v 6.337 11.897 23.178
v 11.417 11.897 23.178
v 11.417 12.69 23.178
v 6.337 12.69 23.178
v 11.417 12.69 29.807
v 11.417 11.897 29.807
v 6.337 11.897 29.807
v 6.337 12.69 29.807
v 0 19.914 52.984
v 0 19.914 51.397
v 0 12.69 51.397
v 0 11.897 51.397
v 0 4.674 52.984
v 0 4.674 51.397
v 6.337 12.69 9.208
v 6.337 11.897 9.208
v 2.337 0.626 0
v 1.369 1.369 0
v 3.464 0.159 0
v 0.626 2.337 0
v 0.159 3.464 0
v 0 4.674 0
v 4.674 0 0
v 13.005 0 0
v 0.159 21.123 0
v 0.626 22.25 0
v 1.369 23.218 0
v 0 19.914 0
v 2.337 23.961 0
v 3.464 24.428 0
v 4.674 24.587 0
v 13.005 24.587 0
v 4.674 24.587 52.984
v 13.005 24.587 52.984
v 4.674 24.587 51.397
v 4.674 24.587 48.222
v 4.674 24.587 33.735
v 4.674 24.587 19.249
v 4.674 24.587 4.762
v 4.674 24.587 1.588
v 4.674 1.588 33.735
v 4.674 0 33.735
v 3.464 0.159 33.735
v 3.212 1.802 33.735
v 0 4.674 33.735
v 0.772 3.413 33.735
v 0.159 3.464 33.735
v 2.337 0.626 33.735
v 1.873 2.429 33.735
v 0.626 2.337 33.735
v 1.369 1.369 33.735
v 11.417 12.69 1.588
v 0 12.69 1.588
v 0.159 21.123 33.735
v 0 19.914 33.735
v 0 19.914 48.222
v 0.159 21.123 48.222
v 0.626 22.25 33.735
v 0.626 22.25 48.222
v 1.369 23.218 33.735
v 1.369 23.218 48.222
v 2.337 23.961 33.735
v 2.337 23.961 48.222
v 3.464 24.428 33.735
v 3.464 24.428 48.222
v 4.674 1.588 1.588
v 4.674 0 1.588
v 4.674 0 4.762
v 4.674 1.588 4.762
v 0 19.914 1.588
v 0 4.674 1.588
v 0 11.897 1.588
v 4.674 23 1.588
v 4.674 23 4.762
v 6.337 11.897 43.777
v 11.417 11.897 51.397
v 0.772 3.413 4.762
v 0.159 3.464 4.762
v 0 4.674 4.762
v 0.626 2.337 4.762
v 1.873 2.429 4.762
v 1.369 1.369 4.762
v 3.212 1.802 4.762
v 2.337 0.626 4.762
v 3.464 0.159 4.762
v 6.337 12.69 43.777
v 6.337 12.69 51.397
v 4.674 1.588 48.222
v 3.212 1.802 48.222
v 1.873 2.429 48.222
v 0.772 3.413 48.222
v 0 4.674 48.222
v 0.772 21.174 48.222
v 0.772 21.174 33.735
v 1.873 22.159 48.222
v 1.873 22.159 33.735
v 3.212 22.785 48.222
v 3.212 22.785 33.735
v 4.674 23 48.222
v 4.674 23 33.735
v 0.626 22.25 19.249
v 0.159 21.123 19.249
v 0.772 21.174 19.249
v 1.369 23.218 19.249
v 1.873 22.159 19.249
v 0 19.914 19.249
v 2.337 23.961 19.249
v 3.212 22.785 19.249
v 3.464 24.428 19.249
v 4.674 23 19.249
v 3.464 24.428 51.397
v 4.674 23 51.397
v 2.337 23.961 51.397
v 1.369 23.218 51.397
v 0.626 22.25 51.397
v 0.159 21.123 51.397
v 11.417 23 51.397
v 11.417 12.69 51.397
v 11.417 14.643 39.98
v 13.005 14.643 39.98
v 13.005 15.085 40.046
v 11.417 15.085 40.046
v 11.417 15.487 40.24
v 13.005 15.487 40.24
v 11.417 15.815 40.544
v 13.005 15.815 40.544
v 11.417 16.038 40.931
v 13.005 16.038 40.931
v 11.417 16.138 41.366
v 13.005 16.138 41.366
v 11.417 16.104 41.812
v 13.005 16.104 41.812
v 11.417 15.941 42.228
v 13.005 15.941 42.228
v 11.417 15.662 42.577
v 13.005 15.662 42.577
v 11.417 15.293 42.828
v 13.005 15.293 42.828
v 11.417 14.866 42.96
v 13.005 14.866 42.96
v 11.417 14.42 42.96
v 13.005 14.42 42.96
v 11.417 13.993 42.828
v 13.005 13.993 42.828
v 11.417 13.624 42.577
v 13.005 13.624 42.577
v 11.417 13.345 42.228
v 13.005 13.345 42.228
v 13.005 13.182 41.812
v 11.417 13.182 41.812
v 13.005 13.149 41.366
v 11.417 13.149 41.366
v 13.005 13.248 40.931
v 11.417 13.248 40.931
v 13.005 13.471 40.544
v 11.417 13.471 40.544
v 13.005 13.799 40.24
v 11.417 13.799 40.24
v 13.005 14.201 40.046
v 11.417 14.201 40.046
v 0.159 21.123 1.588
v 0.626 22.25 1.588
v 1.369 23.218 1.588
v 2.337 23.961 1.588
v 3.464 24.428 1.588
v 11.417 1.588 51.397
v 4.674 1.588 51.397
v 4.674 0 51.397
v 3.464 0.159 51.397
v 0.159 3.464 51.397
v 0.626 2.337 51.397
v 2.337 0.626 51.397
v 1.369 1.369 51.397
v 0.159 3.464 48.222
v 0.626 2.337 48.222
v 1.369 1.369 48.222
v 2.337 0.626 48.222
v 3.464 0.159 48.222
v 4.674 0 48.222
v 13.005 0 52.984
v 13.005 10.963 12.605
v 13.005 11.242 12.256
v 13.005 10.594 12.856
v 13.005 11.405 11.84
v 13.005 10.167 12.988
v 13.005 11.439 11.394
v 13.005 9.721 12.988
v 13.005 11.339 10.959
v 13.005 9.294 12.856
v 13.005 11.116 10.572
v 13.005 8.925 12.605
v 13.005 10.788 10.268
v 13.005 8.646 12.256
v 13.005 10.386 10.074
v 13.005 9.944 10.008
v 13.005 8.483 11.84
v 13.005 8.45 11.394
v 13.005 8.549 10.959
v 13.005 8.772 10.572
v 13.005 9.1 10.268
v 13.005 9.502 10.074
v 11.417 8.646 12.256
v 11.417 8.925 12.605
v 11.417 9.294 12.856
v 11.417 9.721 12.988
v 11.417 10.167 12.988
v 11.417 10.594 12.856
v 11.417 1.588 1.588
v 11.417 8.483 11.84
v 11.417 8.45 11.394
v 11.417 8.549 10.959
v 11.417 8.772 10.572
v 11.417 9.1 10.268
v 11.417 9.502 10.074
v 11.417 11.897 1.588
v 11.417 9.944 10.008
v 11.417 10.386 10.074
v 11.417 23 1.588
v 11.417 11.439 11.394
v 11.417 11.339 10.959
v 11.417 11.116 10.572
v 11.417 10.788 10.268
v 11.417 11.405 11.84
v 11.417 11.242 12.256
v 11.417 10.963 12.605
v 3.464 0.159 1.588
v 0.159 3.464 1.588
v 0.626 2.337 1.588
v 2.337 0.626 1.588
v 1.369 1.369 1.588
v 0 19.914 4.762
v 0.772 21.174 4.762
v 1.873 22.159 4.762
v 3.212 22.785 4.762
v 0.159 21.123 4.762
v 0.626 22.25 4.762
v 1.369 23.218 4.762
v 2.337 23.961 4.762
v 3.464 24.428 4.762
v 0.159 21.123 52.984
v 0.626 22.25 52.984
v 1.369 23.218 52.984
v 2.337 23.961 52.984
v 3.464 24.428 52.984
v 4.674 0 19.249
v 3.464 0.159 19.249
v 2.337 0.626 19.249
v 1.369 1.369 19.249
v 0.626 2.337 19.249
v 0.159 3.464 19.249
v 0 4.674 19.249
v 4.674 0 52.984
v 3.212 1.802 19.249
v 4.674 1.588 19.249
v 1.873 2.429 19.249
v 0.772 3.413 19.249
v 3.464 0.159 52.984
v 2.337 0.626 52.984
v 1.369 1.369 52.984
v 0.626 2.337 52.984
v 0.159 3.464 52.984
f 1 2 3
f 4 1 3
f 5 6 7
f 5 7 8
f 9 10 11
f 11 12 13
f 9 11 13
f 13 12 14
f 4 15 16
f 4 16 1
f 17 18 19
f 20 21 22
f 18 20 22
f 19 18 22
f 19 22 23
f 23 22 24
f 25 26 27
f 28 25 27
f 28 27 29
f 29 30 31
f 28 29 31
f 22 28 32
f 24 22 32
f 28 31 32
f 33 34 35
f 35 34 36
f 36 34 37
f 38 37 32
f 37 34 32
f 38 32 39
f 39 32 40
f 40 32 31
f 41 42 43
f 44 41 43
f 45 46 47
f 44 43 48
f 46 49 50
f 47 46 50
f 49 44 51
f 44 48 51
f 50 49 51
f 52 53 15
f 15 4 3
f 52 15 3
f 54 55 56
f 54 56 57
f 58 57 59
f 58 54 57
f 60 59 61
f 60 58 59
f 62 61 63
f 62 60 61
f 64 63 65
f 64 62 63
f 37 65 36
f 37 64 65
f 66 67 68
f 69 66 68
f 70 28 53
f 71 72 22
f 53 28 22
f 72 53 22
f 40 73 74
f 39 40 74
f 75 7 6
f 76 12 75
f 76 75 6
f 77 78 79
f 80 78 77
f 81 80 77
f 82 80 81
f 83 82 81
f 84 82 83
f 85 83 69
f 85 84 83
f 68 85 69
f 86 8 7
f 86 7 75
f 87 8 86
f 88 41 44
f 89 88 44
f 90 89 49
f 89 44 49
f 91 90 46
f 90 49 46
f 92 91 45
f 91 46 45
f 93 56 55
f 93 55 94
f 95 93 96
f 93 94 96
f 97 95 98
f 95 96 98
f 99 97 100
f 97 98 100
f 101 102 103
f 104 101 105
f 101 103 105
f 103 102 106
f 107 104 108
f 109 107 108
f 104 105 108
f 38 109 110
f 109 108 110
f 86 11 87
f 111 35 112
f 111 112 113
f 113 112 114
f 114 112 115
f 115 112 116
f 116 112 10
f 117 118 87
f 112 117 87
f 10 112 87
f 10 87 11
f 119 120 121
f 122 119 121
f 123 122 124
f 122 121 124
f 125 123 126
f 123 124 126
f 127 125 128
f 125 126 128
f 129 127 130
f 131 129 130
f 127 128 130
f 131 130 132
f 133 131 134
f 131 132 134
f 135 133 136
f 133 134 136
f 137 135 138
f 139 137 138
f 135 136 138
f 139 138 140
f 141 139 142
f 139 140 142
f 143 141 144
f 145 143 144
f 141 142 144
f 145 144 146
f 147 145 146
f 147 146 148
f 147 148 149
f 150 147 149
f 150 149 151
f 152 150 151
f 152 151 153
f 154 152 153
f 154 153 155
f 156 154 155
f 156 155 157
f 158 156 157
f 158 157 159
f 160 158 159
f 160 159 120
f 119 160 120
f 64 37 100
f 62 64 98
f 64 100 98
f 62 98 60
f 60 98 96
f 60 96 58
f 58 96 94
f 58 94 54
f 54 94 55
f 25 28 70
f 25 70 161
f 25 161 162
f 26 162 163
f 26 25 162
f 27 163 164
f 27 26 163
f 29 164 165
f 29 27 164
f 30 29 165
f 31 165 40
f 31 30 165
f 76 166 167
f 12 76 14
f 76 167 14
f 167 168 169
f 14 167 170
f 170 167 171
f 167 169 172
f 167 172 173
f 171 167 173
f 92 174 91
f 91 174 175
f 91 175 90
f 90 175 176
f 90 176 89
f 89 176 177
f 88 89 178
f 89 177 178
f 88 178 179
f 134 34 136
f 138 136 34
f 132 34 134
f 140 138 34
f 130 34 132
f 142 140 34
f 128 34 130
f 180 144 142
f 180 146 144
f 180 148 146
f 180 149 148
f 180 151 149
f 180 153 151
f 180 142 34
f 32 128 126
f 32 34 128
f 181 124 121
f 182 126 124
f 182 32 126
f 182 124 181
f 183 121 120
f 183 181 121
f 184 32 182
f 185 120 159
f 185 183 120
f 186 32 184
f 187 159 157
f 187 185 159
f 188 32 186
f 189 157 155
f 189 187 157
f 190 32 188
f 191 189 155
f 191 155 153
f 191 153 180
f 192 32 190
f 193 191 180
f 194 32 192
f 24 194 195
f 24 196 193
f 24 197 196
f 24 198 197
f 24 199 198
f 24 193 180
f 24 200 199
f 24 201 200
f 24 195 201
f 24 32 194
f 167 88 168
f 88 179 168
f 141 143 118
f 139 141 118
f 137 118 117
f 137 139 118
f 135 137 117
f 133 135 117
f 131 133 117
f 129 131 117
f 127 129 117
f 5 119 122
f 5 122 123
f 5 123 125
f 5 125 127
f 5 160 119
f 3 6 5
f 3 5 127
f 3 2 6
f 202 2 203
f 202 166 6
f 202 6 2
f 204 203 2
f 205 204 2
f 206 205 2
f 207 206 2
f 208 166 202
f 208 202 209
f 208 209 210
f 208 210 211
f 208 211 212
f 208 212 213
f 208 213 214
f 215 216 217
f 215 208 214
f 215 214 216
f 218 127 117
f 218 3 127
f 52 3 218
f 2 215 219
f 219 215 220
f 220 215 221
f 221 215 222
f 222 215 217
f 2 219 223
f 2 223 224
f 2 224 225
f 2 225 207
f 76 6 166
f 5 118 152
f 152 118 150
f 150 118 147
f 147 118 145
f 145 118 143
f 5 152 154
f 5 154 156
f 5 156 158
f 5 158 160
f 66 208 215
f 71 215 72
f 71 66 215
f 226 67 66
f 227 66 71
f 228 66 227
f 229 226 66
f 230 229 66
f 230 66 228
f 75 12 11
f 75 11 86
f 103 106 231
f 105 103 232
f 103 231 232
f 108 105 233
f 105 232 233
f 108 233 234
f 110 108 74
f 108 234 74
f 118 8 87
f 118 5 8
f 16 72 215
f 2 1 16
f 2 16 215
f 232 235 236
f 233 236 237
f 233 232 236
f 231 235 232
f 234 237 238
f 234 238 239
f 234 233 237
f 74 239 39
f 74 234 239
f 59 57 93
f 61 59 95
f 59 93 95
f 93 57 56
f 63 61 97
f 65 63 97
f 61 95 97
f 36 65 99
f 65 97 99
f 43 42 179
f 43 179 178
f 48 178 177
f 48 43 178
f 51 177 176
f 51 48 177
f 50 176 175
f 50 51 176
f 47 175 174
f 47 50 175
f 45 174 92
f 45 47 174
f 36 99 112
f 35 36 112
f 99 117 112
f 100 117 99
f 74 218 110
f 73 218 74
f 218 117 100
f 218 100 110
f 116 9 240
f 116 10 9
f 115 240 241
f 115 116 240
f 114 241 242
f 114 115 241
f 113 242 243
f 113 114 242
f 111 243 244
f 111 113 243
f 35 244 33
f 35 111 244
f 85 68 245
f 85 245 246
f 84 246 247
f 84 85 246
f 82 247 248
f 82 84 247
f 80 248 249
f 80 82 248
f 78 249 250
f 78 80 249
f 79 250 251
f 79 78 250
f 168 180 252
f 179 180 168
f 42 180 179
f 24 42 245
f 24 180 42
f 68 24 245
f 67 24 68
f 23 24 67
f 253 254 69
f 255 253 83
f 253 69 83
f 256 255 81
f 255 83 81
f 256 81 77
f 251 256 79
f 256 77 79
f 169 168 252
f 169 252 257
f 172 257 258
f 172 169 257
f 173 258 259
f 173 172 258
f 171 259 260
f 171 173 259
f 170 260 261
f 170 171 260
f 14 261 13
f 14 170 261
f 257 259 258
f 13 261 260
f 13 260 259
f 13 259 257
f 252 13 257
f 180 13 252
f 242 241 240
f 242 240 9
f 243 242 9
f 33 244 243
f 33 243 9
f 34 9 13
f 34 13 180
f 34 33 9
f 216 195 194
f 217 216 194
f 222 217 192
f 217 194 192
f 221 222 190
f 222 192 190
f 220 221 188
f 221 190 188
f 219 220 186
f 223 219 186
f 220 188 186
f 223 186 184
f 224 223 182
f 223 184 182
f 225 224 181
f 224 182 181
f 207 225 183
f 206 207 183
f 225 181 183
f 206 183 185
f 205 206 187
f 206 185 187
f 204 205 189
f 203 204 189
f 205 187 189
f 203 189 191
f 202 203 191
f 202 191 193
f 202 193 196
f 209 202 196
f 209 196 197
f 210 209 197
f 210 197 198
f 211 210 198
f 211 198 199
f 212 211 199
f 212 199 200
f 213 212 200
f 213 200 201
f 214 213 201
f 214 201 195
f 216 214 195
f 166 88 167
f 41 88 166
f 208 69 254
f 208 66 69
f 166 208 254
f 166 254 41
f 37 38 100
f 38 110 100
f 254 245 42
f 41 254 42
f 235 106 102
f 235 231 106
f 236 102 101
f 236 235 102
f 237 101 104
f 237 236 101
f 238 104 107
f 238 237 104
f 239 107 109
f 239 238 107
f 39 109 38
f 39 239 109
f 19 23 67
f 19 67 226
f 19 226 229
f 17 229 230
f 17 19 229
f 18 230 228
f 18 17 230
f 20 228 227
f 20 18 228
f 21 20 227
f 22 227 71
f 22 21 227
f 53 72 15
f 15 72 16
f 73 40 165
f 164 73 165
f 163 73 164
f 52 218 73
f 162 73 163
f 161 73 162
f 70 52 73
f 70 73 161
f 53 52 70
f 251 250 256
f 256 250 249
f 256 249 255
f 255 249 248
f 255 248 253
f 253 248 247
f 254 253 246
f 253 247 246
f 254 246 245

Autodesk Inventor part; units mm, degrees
ref_plane "YZ Plane" through (0, 0, 0) normal (1, 0, 0) x (0, 1, 0)
ref_plane "XZ Plane" through (0, 0, 0) normal (0, 1, 0) x (-1, 0, 0)
ref_plane "XY Plane" through (0, 0, 0) normal (0, 0, 1) x (1, 0, 0)
sketch "Sketch1" plane through (0, 0, 0) normal (0, 0, 1) x (1, 0, 0)
  line L0 (13.0048, 24.5872) -> (13.0048, 0)
  line L1 (13.0048, 0) -> (4.6736, 0)
  line L2 (13.0048, 24.5872) -> (4.6736, 24.5872)
  line L3 (0, 19.9136) -> (0, 4.6736)
  arc A0 (4.6736, 24.5872) -> (0, 19.9136) centre (4.6736, 19.9136) ccw
  arc A1 (0, 4.6736) -> (4.6736, 0) centre (4.6736, 4.6736) ccw
  point P0 (0, 0)
  dimension "d0" = 13.0048
  dimension "d1" = 24.5872
  dimension "d2" = 15.24
extrude "Extrusion1" add sketch "Sketch1" along normal blind 52.9844
sketch "Sketch2" plane through (4.6736, 0, 0) normal (0, -1, 0) x (1, 0, 0)
  line L0 (0, 0) -> (0, 52.9844) projected
  line L1 (0, 1.5875) -> (-4.6736, 1.5875)
  line L2 (-4.6736, 1.5875) -> (-4.6736, 4.7625)
  line L3 (-4.6736, 4.7625) -> (0, 4.7625)
  line L4 (0, 4.7625) -> (0, 1.5875)
  line L5 (-4.6736, 19.249) -> (0, 19.249)
  line L6 (0, 19.249) -> (0, 33.7354)
  line L7 (0, 33.7354) -> (-4.6736, 33.7354)
  line L8 (-4.6736, 33.7354) -> (-4.6736, 19.249)
  line L9 (-4.6736, 48.2219) -> (0, 48.2219)
  line L10 (0, 48.2219) -> (0, 51.3969)
  line L11 (0, 51.3969) -> (-4.6736, 51.3969)
  line L12 (-4.6736, 51.3969) -> (-4.6736, 48.2219)
  line L13 (-4.6736, 0) -> (0, 0) projected
  line L14 (-4.6736, 52.9844) -> (0, 52.9844) projected
  dimension "d5" = 1.5875
  dimension "d6" = 1.5875
  dimension "d7" = 3.175
  dimension "d8" = 3.175
  dimension "d9" = 14.4865
  dimension "d10" = 14.4865
  dimension "d11" = 14.4865
extrude "Extrusion2" cut sketch "Sketch2" against normal through all
sketch "Sketch6" plane through (0, 0, 0) normal (0, 0, -1) x (-1, 0, 0)
  line L0 (-13.0048, 24.5872) -> (-13.0048, 0) projected
  line L1 (-13.0048, 0) -> (-4.6736, 0) projected
  arc A0 (-4.6736, 0) -> (0, 4.6736) centre (-4.6736, 4.6736) ccw projected
  line L2 (0, 4.6736) -> (0, 19.9136) projected
  arc A1 (0, 19.9136) -> (-4.6736, 24.5872) centre (-4.6736, 19.9136) ccw projected
  line L3 (-4.6736, 24.5872) -> (-13.0048, 24.5872) projected
  line L4 (-1.5875, 19.9136) -> (-1.5875, 4.6736)
  arc A2 (-4.6736, 1.5875) -> (-1.5875, 4.6736) centre (-4.6736, 4.6736) ccw
  line L5 (-4.6736, 1.5875) -> (-11.4173, 1.5875)
  line L6 (-11.4173, 1.5875) -> (-11.4173, 22.9997)
  line L7 (-11.4173, 22.9997) -> (-4.6736, 22.9997)
  arc A3 (-1.5875, 19.9136) -> (-4.6736, 22.9997) centre (-4.6736, 19.9136) ccw
  point P0 (0, 0)
  dimension "d14" = 1.5875
extrude "Extrusion3" cut sketch "Sketch6" against normal up to surface (49.8094 mm away) from surface at -1.5875 contours L4 A2 L5 L6 L7 A3
sketch "Sketch7" plane through (0, 0, 0) normal (0, 0, -1) x (-1, 0, 0)
  line L0 (-13.0048, 24.5872) -> (-13.0048, 0) projected
  line L1 (-13.0048, 0) -> (-4.6736, 0) projected
  arc A0 (-4.6736, 0) -> (0, 4.6736) centre (-4.6736, 4.6736) ccw projected
  line L2 (0, 4.6736) -> (0, 19.9136) projected
  arc A1 (0, 19.9136) -> (-4.6736, 24.5872) centre (-4.6736, 19.9136) ccw projected
  line L3 (-4.6736, 24.5872) -> (-13.0048, 24.5872) projected
  line L4 (-1.5875, 23.4234) -> (-1.5875, 1.1638)
  arc A2 (-1.5875, 19.9136) -> (-4.6736, 22.9997) centre (-4.6736, 19.9136) ccw
  line L5 (-1.5875, 19.9136) -> (-1.5875, 4.6736)
  arc A3 (-4.6736, 1.5875) -> (-1.5875, 4.6736) centre (-4.6736, 4.6736) ccw
  line L6 (-4.6736, 1.5875) -> (-11.4173, 1.5875)
  line L7 (-11.4173, 1.5875) -> (-11.4173, 22.9997)
  line L8 (-11.4173, 22.9997) -> (-4.6736, 22.9997)
  arc A4 (0, 19.9136) -> (-4.6736, 22.9997) centre (-4.6736, 17.9178) ccw
  arc A5 (-4.6736, 1.5875) -> (0, 4.6736) centre (-4.6736, 6.6694) ccw
  point P0 (0, 0)
  dimension "d17" = 1.5875
  dimension "d20" = 1.5875
extrude "Extrusion4" cut sketch "Sketch7" against normal up to surface (43.4594 mm away) from surface at -4.7625 contours L2 A5 L4 A4 | L4 A2 A4 | A5 A3 L4
sketch "Sketch8" plane through (11.4173, 1.5875, 1.5875) normal (-1, 0, 0) x (0, 0, 1)
  line L0 (0, 0) -> (0, 21.4122) projected
  line L1 (0, 0) -> (49.8094, 0) projected
  line L2 (49.8094, 21.4122) -> (49.8094, 0) projected
  line L3 (0, 21.4122) -> (49.8094, 21.4122) projected
  line L4 (0, 10.3092) -> (21.59, 10.3092)
  line L5 (21.59, 10.3092) -> (21.59, 11.103)
  line L6 (21.59, 11.103) -> (0, 11.103)
  line L7 (0, 11.103) -> (0, 10.3092)
  line L8 (49.8094, 10.3092) -> (28.2194, 10.3092)
  line L9 (28.2194, 10.3092) -> (28.2194, 11.103)
  line L10 (28.2194, 11.103) -> (49.8094, 11.103)
  line L11 (49.8094, 11.103) -> (49.8094, 10.3092)
  point P0 (-1.5875, -1.5875)
  dimension "d23" = 0.7937
  dimension "d24" = 0.7937
  dimension "d25" = 10.3092
  dimension "d26" = 10.3092
  dimension "d27" = 10.3092
  dimension "d28" = 21.59
  dimension "d29" = 21.59
extrude "Extrusion5" add sketch "Sketch8" along normal blind 5.08 contours L0 L6 L5 L4 | L8 L9 L10 L2
sketch "Sketch10" plane through (11.4173, 11.8967, 1.5875) normal (0, -1, 0) x (1, 0, 0)
  line L0 (-5.08, 21.59) -> (-5.08, 0) projected
  line L1 (-11.4173, 0) -> (-5.08, 7.62)
  line L2 (-5.08, 7.62) -> (-5.08, 0)
  line L3 (-11.4173, 0) -> (-5.08, 0)
  point P0 (-11.4173, -1.5875)
  dimension "d32" = 7.62
extrude "Extrusion6" add sketch "Sketch10" against normal up to surface (0.7938 mm away) from surface at 0
sketch "Sketch11" plane through (11.4173, 11.8967, 29.8069) normal (0, -1, 0) x (1, 0, 0)
  line L0 (-5.08, 21.59) -> (-5.08, 0) projected
  line L1 (-11.4173, 21.59) -> (-5.08, 13.97)
  line L2 (-5.08, 13.97) -> (-5.08, 21.59)
  line L3 (-5.08, 21.59) -> (-11.4173, 21.59)
  line L4 (-6.7437, 21.59) -> (-11.4173, 21.59) projected
  line L5 (-11.4173, 21.59) -> (-11.4173, 23.1775) projected
  point P0 (-11.4173, -29.8069)
  dimension "d35" = 7.62
extrude "Extrusion7" add sketch "Sketch11" against normal up to surface (0.7937 mm away) from surface at 0
sketch "Sketch12" plane through (13.0048, 0, 0) normal (1, 0, 0) x (0, 0, -1)
  line L0 (0, 0) -> (-52.9844, 0) projected
  line L1 (0, 24.5872) -> (0, 0) projected
  circle A0 centre (-11.5062, 9.9441) radius 1.4986
  circle A1 centre (-41.4782, 14.6431) radius 1.4986
  dimension "d38" = 2.9972
  dimension "d39" = 29.972
  dimension "d40" = 4.699
  dimension "d41" = 52.9844
  dimension "d42" = 24.5872
  dimension "d43" = 9.9441
  dimension "d44" = 11.5062
extrude "Extrusion8" cut sketch "Sketch12" against normal up to surface (1.5875 mm away) from surface at 0
equation "\"d9\" = d11"
equation "\"d10\" = d11"
equation "\"d24\" = d23"
equation "\"d25\" = d26"
equation "\"d27\" = d25"
equation "\"d43\" = -0.5 * d40 + 0.5 * d42"
equation "\"d44\" = -0.5 * d39 + 0.5 * d41"
properties part number "aaa_holder"
